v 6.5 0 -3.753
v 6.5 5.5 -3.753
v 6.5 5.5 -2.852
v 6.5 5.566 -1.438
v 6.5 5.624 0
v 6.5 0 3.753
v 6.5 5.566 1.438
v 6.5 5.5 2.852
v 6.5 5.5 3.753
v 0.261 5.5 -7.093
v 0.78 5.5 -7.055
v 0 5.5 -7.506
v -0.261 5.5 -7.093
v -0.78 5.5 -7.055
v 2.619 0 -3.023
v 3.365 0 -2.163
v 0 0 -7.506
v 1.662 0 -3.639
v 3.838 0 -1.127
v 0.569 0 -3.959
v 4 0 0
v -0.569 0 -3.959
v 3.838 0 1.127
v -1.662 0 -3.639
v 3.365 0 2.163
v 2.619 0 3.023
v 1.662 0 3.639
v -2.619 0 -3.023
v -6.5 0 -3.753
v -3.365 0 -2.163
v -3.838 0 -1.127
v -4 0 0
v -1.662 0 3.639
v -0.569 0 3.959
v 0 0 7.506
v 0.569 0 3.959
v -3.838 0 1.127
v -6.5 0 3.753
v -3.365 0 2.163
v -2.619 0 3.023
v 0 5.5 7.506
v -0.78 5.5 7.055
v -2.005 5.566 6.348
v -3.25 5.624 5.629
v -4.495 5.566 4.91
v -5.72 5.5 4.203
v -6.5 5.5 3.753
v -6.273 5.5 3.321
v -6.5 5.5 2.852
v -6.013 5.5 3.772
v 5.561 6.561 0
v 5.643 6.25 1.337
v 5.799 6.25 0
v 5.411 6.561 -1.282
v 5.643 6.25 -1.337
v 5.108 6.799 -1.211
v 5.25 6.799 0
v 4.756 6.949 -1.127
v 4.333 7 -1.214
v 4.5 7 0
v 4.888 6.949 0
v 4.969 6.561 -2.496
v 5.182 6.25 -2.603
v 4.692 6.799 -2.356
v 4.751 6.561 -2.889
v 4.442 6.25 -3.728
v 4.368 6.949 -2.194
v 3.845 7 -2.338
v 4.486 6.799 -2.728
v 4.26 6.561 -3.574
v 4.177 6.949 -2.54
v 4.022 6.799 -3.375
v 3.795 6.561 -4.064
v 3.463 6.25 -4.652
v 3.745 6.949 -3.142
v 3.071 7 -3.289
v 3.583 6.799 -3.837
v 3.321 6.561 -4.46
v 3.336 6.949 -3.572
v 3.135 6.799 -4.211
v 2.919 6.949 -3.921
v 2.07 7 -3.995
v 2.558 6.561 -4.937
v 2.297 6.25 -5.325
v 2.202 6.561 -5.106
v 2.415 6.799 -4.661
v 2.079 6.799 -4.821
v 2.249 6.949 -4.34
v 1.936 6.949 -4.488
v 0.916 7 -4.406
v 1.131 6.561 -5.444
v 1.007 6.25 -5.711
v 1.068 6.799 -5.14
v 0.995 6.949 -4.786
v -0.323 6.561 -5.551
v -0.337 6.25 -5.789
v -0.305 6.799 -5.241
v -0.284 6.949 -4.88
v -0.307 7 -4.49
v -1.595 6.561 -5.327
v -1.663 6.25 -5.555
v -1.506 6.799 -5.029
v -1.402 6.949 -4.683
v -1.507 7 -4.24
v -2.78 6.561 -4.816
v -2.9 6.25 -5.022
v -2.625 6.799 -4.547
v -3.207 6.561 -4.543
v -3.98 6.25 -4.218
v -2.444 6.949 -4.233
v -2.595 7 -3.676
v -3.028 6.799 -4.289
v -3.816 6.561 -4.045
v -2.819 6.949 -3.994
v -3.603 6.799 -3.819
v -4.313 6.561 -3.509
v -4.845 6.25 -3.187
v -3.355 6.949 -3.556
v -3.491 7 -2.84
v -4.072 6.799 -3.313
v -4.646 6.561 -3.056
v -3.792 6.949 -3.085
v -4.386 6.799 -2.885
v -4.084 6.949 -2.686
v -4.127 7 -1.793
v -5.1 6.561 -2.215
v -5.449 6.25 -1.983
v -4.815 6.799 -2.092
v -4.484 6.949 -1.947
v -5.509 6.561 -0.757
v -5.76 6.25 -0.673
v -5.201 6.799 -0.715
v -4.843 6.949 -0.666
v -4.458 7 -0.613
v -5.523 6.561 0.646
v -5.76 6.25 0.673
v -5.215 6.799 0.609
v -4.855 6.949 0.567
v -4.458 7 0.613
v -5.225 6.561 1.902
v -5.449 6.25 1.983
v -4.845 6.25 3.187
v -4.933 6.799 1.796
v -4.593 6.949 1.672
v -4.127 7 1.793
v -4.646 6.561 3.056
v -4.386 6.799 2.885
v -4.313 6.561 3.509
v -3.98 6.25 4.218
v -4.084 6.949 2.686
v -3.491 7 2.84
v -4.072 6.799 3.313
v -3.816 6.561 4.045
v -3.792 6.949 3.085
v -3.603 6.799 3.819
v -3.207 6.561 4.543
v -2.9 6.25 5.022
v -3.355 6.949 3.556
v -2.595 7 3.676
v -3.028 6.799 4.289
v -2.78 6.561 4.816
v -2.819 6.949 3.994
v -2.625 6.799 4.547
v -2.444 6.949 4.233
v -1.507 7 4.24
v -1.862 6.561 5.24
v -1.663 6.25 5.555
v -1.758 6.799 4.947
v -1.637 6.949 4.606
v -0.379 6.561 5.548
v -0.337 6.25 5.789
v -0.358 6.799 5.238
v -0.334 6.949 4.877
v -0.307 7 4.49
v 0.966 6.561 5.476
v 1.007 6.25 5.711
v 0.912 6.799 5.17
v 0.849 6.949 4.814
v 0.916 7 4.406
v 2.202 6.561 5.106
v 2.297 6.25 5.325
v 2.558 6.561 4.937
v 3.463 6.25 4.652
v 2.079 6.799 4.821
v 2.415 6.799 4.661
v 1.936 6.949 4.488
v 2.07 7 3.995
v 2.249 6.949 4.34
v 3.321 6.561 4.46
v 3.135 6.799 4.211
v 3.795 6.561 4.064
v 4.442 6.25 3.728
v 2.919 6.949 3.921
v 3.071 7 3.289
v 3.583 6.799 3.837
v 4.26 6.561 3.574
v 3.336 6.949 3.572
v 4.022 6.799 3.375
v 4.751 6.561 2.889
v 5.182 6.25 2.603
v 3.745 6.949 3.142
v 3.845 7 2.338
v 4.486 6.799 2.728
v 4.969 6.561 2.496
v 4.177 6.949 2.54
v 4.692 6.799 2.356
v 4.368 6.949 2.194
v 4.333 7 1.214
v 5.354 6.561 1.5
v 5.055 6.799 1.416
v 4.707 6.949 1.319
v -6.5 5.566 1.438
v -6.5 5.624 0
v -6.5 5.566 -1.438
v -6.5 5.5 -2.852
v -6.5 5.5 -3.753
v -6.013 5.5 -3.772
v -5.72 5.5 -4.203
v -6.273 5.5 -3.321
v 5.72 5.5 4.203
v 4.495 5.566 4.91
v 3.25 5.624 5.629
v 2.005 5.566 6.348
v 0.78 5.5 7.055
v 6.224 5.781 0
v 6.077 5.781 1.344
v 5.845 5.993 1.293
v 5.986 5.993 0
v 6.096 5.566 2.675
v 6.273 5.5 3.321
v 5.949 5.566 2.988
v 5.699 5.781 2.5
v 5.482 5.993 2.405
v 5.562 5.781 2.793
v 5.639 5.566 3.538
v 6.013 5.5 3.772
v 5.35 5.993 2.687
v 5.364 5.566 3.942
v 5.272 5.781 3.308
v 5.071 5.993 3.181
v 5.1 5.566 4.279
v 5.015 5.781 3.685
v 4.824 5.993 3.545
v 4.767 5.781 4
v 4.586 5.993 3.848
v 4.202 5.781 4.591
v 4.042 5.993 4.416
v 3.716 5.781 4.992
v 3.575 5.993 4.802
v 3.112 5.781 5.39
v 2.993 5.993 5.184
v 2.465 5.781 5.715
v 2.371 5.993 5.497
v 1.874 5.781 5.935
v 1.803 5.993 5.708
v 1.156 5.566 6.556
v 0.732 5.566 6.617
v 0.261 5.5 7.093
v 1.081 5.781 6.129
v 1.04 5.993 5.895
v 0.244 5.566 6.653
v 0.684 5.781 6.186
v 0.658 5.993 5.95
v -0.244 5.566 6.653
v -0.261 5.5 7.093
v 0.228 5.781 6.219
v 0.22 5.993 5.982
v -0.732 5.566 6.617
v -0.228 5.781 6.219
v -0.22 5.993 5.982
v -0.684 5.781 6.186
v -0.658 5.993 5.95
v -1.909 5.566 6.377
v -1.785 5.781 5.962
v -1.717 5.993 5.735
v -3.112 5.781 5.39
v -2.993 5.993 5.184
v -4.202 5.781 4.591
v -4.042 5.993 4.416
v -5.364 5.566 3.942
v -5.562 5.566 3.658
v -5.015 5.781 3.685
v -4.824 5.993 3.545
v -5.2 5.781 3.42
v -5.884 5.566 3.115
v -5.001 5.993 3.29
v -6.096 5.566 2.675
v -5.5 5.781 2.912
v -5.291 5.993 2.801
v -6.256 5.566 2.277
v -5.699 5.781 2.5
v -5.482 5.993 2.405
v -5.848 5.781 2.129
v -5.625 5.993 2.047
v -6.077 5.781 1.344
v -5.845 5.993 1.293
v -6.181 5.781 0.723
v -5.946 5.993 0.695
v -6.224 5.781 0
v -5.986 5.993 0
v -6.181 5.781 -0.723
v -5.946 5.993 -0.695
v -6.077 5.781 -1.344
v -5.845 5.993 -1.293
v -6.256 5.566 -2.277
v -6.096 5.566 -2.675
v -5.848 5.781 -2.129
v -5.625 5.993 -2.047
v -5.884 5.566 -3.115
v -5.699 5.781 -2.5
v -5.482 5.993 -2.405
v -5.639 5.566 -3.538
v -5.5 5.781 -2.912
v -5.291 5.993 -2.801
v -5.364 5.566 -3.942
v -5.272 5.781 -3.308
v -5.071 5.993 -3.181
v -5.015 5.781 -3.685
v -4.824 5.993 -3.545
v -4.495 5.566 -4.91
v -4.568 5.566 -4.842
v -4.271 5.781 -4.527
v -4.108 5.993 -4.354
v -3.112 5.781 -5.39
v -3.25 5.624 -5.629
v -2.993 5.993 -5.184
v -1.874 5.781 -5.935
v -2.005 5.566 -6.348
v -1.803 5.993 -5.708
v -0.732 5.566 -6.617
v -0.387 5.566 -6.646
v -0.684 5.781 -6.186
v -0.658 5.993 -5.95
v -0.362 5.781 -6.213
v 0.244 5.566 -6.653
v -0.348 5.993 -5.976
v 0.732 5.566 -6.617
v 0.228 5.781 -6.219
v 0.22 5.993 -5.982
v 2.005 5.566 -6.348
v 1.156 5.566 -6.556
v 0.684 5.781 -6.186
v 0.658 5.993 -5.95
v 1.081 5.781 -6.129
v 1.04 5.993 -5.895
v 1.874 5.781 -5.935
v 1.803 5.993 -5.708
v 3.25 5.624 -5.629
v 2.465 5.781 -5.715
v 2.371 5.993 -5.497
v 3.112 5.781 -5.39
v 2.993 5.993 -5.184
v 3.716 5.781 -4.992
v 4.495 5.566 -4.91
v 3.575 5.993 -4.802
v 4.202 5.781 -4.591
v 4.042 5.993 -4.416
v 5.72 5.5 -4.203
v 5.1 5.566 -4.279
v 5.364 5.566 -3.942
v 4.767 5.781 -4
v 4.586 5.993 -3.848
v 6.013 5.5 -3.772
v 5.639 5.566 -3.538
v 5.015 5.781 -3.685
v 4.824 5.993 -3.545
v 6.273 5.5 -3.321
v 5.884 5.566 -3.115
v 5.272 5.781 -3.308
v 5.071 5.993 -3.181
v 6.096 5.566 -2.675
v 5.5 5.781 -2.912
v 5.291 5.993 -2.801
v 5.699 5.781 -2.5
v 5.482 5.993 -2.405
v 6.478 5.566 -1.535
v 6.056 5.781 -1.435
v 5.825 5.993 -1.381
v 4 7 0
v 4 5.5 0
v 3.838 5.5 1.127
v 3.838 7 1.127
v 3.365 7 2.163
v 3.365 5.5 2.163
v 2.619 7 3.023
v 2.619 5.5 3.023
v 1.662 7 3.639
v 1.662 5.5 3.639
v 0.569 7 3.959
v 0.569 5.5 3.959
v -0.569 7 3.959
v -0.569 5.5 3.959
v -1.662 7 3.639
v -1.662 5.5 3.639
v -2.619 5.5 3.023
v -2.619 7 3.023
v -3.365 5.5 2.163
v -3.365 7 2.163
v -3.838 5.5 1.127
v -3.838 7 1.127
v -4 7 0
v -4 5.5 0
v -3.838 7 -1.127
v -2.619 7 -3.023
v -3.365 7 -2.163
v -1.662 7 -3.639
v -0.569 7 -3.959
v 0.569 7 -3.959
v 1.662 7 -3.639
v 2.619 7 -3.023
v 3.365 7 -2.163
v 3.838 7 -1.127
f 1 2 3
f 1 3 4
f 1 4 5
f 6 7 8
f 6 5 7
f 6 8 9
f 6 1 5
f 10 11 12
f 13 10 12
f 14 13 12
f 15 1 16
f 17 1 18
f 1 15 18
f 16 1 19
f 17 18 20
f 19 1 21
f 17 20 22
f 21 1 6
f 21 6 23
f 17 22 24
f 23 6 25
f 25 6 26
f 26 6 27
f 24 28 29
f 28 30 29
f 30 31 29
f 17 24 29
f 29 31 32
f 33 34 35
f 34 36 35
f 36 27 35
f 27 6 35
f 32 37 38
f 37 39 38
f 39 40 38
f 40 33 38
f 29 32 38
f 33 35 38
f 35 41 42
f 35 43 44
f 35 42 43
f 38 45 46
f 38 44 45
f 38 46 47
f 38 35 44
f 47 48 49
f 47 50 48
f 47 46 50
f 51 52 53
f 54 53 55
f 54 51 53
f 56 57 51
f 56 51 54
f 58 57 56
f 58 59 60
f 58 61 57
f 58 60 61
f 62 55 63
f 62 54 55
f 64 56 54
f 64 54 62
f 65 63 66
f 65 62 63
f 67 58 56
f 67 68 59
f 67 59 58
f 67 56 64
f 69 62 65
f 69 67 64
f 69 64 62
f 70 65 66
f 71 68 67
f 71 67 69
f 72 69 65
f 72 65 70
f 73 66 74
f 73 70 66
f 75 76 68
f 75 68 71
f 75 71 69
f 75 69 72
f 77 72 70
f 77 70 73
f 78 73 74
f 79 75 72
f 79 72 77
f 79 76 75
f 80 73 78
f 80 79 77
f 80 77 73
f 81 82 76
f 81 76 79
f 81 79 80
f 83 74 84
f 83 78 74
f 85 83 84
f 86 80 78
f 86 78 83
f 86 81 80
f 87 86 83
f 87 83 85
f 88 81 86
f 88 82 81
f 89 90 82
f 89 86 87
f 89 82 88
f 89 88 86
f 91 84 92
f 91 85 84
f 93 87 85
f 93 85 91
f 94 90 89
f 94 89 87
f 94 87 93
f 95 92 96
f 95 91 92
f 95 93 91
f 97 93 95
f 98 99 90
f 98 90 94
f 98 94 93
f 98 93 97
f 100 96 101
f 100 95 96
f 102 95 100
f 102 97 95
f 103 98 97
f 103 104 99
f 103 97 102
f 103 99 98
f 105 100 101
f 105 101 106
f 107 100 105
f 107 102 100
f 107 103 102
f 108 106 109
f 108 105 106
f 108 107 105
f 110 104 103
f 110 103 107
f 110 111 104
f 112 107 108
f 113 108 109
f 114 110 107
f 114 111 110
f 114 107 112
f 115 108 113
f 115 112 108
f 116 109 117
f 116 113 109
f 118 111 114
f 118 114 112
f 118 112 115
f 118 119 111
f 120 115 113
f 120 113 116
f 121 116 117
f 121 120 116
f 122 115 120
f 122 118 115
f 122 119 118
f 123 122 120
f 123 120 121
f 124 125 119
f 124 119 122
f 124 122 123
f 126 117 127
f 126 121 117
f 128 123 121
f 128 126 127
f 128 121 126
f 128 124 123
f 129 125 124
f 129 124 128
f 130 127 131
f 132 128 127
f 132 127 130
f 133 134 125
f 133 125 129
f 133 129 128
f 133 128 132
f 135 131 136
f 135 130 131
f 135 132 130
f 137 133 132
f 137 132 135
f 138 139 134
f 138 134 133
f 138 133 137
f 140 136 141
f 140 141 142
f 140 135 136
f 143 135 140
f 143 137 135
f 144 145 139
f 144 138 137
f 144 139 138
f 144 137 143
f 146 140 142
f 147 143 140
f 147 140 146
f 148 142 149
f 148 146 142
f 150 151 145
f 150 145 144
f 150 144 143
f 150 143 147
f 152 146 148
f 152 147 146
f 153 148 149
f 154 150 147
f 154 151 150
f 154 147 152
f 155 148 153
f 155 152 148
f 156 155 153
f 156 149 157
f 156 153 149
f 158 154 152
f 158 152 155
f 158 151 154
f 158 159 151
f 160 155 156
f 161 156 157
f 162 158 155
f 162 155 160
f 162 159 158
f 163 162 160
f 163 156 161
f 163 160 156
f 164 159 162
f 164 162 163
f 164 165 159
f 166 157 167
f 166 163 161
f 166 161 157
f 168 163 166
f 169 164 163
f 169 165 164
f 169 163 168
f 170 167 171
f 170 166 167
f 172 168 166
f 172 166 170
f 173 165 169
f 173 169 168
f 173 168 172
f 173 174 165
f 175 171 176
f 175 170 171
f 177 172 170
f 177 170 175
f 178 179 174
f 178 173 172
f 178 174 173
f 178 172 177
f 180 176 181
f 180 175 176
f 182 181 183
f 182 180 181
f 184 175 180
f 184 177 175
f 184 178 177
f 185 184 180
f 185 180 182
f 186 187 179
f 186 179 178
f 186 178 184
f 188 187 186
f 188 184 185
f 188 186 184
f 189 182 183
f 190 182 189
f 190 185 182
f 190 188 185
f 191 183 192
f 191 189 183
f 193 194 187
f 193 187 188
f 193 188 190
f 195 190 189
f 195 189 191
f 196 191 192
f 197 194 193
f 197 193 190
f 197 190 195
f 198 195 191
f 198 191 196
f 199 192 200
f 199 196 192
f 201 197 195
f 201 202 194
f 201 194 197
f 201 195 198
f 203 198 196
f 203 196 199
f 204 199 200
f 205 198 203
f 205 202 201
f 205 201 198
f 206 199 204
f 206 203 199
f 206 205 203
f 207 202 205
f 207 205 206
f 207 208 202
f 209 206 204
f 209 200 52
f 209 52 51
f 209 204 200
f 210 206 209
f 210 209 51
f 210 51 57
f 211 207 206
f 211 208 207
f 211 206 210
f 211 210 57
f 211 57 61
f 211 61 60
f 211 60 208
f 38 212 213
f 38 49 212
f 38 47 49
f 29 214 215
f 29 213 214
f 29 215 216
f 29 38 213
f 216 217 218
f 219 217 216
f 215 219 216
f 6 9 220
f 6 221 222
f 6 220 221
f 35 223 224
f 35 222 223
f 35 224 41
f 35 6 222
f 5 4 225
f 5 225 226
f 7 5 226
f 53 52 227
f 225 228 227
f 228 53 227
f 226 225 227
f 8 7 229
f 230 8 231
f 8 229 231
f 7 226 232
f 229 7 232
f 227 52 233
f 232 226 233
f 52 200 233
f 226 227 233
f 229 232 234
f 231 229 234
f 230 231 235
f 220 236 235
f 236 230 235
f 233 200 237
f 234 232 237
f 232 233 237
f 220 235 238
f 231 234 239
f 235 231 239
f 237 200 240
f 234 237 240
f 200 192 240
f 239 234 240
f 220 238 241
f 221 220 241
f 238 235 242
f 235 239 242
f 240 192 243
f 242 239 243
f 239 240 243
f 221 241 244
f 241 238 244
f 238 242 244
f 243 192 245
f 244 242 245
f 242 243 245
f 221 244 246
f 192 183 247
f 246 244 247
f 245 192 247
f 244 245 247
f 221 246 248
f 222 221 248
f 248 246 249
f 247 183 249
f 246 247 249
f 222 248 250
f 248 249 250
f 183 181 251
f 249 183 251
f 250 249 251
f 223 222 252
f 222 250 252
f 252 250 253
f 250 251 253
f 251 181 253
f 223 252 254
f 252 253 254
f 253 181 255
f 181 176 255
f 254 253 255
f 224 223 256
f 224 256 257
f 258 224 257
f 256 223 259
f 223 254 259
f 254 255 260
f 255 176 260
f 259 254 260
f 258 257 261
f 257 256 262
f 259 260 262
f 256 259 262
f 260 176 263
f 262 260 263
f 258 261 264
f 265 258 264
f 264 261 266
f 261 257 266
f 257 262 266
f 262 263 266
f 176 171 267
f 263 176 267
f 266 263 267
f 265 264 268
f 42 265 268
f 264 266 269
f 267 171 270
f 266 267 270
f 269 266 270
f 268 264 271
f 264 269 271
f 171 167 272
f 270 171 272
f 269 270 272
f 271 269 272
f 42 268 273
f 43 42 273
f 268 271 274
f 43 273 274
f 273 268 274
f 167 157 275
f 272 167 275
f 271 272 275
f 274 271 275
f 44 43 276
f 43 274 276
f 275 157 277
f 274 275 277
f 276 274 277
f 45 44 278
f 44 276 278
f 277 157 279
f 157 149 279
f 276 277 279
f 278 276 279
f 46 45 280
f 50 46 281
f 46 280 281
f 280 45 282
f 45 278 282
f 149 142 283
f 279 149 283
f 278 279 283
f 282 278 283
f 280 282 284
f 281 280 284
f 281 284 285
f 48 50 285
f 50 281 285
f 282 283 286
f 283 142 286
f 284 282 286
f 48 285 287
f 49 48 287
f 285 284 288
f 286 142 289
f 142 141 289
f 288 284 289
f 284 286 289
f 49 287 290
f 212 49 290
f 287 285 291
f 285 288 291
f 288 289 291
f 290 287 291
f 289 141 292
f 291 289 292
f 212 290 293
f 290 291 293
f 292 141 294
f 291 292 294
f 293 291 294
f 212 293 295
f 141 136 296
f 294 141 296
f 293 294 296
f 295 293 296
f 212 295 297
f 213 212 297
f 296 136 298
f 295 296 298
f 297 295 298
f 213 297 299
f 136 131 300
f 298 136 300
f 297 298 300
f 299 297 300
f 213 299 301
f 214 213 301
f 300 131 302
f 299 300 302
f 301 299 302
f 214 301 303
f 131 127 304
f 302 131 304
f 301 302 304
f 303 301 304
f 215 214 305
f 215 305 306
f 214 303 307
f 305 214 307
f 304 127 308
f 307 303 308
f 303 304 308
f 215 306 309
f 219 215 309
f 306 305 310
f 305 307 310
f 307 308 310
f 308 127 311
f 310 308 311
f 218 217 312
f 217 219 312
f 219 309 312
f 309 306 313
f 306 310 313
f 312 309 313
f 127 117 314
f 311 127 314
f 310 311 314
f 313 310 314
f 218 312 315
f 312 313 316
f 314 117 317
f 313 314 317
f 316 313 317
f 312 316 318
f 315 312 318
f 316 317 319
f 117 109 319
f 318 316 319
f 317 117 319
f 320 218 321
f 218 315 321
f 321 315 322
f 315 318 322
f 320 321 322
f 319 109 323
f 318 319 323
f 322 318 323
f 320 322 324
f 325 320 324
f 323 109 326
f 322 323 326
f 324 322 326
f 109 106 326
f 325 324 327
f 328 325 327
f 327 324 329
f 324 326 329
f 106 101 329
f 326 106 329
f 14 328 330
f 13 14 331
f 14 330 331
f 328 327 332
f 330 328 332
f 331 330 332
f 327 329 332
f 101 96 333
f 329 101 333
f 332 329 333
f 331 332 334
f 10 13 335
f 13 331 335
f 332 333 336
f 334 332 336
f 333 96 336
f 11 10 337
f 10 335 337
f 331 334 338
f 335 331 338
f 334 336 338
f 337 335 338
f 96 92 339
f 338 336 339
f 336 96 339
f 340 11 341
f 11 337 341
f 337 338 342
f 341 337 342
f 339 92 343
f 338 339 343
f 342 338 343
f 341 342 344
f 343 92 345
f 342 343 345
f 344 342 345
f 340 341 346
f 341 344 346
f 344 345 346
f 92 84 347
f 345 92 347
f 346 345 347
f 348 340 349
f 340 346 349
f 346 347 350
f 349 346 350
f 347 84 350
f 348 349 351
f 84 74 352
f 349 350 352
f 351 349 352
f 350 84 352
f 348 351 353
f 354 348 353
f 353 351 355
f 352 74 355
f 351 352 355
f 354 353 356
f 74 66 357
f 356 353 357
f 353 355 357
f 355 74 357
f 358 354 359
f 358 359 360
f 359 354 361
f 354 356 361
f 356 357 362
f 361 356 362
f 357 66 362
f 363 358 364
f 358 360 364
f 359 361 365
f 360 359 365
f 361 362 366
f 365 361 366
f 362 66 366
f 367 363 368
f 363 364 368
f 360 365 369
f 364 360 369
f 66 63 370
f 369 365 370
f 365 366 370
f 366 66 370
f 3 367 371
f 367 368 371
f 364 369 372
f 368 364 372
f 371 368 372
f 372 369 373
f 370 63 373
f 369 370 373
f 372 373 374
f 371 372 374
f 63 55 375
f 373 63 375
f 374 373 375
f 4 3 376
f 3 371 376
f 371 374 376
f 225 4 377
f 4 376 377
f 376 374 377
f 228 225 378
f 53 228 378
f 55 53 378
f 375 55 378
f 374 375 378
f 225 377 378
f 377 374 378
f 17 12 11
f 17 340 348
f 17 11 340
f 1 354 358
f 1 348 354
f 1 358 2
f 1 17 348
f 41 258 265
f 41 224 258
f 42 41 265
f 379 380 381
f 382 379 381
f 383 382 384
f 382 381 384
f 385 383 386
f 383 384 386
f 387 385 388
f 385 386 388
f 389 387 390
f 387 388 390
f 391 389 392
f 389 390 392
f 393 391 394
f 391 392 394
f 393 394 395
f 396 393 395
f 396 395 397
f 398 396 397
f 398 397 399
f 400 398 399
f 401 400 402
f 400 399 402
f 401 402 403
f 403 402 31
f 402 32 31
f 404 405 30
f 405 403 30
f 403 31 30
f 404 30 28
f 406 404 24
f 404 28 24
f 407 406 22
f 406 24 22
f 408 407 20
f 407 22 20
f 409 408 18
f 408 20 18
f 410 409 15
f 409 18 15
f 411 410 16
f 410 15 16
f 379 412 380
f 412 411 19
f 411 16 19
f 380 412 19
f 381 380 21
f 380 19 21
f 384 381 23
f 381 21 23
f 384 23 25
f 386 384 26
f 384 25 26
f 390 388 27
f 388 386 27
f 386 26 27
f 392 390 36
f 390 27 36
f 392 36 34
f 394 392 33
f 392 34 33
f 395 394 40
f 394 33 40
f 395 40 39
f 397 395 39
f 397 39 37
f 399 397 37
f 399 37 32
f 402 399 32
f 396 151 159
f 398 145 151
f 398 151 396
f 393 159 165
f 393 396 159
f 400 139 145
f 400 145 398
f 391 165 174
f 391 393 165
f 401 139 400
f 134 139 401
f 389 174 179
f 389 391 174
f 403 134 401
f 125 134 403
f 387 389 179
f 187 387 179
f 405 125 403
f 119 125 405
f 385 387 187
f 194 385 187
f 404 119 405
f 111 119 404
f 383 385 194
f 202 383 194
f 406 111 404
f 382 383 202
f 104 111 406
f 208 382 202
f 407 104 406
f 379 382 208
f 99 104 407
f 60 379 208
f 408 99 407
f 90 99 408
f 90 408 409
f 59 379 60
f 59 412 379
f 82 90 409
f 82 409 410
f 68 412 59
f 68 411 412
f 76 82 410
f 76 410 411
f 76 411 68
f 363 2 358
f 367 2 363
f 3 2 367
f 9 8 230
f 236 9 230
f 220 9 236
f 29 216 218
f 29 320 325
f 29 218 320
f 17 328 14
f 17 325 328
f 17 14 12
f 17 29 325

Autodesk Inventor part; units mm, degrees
ref_plane "YZ Plane" through (0, 0, 0) normal (1, 0, 0) x (0, 1, 0)
ref_plane "XZ Plane" through (0, 0, 0) normal (0, 1, 0) x (-1, 0, 0)
ref_plane "XY Plane" through (0, 0, 0) normal (0, 0, 1) x (1, 0, 0)
sketch "Sketch1" plane through (0, 0, 0) normal (0, 1, 0) x (-1, 0, 0)
  circle A0 centre (0, 0) radius 4
  line L0 (0, -7.5056) -> (-6.5, -3.7528)
  line L1 (-6.5, -3.7528) -> (-6.5, 3.7528)
  line L2 (-6.5, 3.7528) -> (0, 7.5056)
  line L3 (0, 7.5056) -> (6.5, 3.7528)
  line L4 (6.5, 3.7528) -> (6.5, -3.7528)
  line L5 (6.5, -3.7528) -> (0, -7.5056)
  dimension "d0" = 8
  dimension "d1" = 13
extrude "Extrusion1" add sketch "Sketch1" along normal blind 5.5
sketch "Sketch2" plane through (0, 5.5, 0) normal (0, 1, 0) x (1, 0, 0)
  circle A0 centre (0, 0) radius 4 projected
  circle A1 centre (0, 0) radius 6
  dimension "d6" = 2
extrude "Extrusion2" add sketch "Sketch2" along normal blind 1.5
fillet "Fillet1" radius 1.5 2 edges at (-6, 7, 0) (-6, 5.5, 0)
thread "Thread2" size "M8x1.25" class "6H" standard "ANSI Metric M Profile" full length
properties part number "Mutter"
